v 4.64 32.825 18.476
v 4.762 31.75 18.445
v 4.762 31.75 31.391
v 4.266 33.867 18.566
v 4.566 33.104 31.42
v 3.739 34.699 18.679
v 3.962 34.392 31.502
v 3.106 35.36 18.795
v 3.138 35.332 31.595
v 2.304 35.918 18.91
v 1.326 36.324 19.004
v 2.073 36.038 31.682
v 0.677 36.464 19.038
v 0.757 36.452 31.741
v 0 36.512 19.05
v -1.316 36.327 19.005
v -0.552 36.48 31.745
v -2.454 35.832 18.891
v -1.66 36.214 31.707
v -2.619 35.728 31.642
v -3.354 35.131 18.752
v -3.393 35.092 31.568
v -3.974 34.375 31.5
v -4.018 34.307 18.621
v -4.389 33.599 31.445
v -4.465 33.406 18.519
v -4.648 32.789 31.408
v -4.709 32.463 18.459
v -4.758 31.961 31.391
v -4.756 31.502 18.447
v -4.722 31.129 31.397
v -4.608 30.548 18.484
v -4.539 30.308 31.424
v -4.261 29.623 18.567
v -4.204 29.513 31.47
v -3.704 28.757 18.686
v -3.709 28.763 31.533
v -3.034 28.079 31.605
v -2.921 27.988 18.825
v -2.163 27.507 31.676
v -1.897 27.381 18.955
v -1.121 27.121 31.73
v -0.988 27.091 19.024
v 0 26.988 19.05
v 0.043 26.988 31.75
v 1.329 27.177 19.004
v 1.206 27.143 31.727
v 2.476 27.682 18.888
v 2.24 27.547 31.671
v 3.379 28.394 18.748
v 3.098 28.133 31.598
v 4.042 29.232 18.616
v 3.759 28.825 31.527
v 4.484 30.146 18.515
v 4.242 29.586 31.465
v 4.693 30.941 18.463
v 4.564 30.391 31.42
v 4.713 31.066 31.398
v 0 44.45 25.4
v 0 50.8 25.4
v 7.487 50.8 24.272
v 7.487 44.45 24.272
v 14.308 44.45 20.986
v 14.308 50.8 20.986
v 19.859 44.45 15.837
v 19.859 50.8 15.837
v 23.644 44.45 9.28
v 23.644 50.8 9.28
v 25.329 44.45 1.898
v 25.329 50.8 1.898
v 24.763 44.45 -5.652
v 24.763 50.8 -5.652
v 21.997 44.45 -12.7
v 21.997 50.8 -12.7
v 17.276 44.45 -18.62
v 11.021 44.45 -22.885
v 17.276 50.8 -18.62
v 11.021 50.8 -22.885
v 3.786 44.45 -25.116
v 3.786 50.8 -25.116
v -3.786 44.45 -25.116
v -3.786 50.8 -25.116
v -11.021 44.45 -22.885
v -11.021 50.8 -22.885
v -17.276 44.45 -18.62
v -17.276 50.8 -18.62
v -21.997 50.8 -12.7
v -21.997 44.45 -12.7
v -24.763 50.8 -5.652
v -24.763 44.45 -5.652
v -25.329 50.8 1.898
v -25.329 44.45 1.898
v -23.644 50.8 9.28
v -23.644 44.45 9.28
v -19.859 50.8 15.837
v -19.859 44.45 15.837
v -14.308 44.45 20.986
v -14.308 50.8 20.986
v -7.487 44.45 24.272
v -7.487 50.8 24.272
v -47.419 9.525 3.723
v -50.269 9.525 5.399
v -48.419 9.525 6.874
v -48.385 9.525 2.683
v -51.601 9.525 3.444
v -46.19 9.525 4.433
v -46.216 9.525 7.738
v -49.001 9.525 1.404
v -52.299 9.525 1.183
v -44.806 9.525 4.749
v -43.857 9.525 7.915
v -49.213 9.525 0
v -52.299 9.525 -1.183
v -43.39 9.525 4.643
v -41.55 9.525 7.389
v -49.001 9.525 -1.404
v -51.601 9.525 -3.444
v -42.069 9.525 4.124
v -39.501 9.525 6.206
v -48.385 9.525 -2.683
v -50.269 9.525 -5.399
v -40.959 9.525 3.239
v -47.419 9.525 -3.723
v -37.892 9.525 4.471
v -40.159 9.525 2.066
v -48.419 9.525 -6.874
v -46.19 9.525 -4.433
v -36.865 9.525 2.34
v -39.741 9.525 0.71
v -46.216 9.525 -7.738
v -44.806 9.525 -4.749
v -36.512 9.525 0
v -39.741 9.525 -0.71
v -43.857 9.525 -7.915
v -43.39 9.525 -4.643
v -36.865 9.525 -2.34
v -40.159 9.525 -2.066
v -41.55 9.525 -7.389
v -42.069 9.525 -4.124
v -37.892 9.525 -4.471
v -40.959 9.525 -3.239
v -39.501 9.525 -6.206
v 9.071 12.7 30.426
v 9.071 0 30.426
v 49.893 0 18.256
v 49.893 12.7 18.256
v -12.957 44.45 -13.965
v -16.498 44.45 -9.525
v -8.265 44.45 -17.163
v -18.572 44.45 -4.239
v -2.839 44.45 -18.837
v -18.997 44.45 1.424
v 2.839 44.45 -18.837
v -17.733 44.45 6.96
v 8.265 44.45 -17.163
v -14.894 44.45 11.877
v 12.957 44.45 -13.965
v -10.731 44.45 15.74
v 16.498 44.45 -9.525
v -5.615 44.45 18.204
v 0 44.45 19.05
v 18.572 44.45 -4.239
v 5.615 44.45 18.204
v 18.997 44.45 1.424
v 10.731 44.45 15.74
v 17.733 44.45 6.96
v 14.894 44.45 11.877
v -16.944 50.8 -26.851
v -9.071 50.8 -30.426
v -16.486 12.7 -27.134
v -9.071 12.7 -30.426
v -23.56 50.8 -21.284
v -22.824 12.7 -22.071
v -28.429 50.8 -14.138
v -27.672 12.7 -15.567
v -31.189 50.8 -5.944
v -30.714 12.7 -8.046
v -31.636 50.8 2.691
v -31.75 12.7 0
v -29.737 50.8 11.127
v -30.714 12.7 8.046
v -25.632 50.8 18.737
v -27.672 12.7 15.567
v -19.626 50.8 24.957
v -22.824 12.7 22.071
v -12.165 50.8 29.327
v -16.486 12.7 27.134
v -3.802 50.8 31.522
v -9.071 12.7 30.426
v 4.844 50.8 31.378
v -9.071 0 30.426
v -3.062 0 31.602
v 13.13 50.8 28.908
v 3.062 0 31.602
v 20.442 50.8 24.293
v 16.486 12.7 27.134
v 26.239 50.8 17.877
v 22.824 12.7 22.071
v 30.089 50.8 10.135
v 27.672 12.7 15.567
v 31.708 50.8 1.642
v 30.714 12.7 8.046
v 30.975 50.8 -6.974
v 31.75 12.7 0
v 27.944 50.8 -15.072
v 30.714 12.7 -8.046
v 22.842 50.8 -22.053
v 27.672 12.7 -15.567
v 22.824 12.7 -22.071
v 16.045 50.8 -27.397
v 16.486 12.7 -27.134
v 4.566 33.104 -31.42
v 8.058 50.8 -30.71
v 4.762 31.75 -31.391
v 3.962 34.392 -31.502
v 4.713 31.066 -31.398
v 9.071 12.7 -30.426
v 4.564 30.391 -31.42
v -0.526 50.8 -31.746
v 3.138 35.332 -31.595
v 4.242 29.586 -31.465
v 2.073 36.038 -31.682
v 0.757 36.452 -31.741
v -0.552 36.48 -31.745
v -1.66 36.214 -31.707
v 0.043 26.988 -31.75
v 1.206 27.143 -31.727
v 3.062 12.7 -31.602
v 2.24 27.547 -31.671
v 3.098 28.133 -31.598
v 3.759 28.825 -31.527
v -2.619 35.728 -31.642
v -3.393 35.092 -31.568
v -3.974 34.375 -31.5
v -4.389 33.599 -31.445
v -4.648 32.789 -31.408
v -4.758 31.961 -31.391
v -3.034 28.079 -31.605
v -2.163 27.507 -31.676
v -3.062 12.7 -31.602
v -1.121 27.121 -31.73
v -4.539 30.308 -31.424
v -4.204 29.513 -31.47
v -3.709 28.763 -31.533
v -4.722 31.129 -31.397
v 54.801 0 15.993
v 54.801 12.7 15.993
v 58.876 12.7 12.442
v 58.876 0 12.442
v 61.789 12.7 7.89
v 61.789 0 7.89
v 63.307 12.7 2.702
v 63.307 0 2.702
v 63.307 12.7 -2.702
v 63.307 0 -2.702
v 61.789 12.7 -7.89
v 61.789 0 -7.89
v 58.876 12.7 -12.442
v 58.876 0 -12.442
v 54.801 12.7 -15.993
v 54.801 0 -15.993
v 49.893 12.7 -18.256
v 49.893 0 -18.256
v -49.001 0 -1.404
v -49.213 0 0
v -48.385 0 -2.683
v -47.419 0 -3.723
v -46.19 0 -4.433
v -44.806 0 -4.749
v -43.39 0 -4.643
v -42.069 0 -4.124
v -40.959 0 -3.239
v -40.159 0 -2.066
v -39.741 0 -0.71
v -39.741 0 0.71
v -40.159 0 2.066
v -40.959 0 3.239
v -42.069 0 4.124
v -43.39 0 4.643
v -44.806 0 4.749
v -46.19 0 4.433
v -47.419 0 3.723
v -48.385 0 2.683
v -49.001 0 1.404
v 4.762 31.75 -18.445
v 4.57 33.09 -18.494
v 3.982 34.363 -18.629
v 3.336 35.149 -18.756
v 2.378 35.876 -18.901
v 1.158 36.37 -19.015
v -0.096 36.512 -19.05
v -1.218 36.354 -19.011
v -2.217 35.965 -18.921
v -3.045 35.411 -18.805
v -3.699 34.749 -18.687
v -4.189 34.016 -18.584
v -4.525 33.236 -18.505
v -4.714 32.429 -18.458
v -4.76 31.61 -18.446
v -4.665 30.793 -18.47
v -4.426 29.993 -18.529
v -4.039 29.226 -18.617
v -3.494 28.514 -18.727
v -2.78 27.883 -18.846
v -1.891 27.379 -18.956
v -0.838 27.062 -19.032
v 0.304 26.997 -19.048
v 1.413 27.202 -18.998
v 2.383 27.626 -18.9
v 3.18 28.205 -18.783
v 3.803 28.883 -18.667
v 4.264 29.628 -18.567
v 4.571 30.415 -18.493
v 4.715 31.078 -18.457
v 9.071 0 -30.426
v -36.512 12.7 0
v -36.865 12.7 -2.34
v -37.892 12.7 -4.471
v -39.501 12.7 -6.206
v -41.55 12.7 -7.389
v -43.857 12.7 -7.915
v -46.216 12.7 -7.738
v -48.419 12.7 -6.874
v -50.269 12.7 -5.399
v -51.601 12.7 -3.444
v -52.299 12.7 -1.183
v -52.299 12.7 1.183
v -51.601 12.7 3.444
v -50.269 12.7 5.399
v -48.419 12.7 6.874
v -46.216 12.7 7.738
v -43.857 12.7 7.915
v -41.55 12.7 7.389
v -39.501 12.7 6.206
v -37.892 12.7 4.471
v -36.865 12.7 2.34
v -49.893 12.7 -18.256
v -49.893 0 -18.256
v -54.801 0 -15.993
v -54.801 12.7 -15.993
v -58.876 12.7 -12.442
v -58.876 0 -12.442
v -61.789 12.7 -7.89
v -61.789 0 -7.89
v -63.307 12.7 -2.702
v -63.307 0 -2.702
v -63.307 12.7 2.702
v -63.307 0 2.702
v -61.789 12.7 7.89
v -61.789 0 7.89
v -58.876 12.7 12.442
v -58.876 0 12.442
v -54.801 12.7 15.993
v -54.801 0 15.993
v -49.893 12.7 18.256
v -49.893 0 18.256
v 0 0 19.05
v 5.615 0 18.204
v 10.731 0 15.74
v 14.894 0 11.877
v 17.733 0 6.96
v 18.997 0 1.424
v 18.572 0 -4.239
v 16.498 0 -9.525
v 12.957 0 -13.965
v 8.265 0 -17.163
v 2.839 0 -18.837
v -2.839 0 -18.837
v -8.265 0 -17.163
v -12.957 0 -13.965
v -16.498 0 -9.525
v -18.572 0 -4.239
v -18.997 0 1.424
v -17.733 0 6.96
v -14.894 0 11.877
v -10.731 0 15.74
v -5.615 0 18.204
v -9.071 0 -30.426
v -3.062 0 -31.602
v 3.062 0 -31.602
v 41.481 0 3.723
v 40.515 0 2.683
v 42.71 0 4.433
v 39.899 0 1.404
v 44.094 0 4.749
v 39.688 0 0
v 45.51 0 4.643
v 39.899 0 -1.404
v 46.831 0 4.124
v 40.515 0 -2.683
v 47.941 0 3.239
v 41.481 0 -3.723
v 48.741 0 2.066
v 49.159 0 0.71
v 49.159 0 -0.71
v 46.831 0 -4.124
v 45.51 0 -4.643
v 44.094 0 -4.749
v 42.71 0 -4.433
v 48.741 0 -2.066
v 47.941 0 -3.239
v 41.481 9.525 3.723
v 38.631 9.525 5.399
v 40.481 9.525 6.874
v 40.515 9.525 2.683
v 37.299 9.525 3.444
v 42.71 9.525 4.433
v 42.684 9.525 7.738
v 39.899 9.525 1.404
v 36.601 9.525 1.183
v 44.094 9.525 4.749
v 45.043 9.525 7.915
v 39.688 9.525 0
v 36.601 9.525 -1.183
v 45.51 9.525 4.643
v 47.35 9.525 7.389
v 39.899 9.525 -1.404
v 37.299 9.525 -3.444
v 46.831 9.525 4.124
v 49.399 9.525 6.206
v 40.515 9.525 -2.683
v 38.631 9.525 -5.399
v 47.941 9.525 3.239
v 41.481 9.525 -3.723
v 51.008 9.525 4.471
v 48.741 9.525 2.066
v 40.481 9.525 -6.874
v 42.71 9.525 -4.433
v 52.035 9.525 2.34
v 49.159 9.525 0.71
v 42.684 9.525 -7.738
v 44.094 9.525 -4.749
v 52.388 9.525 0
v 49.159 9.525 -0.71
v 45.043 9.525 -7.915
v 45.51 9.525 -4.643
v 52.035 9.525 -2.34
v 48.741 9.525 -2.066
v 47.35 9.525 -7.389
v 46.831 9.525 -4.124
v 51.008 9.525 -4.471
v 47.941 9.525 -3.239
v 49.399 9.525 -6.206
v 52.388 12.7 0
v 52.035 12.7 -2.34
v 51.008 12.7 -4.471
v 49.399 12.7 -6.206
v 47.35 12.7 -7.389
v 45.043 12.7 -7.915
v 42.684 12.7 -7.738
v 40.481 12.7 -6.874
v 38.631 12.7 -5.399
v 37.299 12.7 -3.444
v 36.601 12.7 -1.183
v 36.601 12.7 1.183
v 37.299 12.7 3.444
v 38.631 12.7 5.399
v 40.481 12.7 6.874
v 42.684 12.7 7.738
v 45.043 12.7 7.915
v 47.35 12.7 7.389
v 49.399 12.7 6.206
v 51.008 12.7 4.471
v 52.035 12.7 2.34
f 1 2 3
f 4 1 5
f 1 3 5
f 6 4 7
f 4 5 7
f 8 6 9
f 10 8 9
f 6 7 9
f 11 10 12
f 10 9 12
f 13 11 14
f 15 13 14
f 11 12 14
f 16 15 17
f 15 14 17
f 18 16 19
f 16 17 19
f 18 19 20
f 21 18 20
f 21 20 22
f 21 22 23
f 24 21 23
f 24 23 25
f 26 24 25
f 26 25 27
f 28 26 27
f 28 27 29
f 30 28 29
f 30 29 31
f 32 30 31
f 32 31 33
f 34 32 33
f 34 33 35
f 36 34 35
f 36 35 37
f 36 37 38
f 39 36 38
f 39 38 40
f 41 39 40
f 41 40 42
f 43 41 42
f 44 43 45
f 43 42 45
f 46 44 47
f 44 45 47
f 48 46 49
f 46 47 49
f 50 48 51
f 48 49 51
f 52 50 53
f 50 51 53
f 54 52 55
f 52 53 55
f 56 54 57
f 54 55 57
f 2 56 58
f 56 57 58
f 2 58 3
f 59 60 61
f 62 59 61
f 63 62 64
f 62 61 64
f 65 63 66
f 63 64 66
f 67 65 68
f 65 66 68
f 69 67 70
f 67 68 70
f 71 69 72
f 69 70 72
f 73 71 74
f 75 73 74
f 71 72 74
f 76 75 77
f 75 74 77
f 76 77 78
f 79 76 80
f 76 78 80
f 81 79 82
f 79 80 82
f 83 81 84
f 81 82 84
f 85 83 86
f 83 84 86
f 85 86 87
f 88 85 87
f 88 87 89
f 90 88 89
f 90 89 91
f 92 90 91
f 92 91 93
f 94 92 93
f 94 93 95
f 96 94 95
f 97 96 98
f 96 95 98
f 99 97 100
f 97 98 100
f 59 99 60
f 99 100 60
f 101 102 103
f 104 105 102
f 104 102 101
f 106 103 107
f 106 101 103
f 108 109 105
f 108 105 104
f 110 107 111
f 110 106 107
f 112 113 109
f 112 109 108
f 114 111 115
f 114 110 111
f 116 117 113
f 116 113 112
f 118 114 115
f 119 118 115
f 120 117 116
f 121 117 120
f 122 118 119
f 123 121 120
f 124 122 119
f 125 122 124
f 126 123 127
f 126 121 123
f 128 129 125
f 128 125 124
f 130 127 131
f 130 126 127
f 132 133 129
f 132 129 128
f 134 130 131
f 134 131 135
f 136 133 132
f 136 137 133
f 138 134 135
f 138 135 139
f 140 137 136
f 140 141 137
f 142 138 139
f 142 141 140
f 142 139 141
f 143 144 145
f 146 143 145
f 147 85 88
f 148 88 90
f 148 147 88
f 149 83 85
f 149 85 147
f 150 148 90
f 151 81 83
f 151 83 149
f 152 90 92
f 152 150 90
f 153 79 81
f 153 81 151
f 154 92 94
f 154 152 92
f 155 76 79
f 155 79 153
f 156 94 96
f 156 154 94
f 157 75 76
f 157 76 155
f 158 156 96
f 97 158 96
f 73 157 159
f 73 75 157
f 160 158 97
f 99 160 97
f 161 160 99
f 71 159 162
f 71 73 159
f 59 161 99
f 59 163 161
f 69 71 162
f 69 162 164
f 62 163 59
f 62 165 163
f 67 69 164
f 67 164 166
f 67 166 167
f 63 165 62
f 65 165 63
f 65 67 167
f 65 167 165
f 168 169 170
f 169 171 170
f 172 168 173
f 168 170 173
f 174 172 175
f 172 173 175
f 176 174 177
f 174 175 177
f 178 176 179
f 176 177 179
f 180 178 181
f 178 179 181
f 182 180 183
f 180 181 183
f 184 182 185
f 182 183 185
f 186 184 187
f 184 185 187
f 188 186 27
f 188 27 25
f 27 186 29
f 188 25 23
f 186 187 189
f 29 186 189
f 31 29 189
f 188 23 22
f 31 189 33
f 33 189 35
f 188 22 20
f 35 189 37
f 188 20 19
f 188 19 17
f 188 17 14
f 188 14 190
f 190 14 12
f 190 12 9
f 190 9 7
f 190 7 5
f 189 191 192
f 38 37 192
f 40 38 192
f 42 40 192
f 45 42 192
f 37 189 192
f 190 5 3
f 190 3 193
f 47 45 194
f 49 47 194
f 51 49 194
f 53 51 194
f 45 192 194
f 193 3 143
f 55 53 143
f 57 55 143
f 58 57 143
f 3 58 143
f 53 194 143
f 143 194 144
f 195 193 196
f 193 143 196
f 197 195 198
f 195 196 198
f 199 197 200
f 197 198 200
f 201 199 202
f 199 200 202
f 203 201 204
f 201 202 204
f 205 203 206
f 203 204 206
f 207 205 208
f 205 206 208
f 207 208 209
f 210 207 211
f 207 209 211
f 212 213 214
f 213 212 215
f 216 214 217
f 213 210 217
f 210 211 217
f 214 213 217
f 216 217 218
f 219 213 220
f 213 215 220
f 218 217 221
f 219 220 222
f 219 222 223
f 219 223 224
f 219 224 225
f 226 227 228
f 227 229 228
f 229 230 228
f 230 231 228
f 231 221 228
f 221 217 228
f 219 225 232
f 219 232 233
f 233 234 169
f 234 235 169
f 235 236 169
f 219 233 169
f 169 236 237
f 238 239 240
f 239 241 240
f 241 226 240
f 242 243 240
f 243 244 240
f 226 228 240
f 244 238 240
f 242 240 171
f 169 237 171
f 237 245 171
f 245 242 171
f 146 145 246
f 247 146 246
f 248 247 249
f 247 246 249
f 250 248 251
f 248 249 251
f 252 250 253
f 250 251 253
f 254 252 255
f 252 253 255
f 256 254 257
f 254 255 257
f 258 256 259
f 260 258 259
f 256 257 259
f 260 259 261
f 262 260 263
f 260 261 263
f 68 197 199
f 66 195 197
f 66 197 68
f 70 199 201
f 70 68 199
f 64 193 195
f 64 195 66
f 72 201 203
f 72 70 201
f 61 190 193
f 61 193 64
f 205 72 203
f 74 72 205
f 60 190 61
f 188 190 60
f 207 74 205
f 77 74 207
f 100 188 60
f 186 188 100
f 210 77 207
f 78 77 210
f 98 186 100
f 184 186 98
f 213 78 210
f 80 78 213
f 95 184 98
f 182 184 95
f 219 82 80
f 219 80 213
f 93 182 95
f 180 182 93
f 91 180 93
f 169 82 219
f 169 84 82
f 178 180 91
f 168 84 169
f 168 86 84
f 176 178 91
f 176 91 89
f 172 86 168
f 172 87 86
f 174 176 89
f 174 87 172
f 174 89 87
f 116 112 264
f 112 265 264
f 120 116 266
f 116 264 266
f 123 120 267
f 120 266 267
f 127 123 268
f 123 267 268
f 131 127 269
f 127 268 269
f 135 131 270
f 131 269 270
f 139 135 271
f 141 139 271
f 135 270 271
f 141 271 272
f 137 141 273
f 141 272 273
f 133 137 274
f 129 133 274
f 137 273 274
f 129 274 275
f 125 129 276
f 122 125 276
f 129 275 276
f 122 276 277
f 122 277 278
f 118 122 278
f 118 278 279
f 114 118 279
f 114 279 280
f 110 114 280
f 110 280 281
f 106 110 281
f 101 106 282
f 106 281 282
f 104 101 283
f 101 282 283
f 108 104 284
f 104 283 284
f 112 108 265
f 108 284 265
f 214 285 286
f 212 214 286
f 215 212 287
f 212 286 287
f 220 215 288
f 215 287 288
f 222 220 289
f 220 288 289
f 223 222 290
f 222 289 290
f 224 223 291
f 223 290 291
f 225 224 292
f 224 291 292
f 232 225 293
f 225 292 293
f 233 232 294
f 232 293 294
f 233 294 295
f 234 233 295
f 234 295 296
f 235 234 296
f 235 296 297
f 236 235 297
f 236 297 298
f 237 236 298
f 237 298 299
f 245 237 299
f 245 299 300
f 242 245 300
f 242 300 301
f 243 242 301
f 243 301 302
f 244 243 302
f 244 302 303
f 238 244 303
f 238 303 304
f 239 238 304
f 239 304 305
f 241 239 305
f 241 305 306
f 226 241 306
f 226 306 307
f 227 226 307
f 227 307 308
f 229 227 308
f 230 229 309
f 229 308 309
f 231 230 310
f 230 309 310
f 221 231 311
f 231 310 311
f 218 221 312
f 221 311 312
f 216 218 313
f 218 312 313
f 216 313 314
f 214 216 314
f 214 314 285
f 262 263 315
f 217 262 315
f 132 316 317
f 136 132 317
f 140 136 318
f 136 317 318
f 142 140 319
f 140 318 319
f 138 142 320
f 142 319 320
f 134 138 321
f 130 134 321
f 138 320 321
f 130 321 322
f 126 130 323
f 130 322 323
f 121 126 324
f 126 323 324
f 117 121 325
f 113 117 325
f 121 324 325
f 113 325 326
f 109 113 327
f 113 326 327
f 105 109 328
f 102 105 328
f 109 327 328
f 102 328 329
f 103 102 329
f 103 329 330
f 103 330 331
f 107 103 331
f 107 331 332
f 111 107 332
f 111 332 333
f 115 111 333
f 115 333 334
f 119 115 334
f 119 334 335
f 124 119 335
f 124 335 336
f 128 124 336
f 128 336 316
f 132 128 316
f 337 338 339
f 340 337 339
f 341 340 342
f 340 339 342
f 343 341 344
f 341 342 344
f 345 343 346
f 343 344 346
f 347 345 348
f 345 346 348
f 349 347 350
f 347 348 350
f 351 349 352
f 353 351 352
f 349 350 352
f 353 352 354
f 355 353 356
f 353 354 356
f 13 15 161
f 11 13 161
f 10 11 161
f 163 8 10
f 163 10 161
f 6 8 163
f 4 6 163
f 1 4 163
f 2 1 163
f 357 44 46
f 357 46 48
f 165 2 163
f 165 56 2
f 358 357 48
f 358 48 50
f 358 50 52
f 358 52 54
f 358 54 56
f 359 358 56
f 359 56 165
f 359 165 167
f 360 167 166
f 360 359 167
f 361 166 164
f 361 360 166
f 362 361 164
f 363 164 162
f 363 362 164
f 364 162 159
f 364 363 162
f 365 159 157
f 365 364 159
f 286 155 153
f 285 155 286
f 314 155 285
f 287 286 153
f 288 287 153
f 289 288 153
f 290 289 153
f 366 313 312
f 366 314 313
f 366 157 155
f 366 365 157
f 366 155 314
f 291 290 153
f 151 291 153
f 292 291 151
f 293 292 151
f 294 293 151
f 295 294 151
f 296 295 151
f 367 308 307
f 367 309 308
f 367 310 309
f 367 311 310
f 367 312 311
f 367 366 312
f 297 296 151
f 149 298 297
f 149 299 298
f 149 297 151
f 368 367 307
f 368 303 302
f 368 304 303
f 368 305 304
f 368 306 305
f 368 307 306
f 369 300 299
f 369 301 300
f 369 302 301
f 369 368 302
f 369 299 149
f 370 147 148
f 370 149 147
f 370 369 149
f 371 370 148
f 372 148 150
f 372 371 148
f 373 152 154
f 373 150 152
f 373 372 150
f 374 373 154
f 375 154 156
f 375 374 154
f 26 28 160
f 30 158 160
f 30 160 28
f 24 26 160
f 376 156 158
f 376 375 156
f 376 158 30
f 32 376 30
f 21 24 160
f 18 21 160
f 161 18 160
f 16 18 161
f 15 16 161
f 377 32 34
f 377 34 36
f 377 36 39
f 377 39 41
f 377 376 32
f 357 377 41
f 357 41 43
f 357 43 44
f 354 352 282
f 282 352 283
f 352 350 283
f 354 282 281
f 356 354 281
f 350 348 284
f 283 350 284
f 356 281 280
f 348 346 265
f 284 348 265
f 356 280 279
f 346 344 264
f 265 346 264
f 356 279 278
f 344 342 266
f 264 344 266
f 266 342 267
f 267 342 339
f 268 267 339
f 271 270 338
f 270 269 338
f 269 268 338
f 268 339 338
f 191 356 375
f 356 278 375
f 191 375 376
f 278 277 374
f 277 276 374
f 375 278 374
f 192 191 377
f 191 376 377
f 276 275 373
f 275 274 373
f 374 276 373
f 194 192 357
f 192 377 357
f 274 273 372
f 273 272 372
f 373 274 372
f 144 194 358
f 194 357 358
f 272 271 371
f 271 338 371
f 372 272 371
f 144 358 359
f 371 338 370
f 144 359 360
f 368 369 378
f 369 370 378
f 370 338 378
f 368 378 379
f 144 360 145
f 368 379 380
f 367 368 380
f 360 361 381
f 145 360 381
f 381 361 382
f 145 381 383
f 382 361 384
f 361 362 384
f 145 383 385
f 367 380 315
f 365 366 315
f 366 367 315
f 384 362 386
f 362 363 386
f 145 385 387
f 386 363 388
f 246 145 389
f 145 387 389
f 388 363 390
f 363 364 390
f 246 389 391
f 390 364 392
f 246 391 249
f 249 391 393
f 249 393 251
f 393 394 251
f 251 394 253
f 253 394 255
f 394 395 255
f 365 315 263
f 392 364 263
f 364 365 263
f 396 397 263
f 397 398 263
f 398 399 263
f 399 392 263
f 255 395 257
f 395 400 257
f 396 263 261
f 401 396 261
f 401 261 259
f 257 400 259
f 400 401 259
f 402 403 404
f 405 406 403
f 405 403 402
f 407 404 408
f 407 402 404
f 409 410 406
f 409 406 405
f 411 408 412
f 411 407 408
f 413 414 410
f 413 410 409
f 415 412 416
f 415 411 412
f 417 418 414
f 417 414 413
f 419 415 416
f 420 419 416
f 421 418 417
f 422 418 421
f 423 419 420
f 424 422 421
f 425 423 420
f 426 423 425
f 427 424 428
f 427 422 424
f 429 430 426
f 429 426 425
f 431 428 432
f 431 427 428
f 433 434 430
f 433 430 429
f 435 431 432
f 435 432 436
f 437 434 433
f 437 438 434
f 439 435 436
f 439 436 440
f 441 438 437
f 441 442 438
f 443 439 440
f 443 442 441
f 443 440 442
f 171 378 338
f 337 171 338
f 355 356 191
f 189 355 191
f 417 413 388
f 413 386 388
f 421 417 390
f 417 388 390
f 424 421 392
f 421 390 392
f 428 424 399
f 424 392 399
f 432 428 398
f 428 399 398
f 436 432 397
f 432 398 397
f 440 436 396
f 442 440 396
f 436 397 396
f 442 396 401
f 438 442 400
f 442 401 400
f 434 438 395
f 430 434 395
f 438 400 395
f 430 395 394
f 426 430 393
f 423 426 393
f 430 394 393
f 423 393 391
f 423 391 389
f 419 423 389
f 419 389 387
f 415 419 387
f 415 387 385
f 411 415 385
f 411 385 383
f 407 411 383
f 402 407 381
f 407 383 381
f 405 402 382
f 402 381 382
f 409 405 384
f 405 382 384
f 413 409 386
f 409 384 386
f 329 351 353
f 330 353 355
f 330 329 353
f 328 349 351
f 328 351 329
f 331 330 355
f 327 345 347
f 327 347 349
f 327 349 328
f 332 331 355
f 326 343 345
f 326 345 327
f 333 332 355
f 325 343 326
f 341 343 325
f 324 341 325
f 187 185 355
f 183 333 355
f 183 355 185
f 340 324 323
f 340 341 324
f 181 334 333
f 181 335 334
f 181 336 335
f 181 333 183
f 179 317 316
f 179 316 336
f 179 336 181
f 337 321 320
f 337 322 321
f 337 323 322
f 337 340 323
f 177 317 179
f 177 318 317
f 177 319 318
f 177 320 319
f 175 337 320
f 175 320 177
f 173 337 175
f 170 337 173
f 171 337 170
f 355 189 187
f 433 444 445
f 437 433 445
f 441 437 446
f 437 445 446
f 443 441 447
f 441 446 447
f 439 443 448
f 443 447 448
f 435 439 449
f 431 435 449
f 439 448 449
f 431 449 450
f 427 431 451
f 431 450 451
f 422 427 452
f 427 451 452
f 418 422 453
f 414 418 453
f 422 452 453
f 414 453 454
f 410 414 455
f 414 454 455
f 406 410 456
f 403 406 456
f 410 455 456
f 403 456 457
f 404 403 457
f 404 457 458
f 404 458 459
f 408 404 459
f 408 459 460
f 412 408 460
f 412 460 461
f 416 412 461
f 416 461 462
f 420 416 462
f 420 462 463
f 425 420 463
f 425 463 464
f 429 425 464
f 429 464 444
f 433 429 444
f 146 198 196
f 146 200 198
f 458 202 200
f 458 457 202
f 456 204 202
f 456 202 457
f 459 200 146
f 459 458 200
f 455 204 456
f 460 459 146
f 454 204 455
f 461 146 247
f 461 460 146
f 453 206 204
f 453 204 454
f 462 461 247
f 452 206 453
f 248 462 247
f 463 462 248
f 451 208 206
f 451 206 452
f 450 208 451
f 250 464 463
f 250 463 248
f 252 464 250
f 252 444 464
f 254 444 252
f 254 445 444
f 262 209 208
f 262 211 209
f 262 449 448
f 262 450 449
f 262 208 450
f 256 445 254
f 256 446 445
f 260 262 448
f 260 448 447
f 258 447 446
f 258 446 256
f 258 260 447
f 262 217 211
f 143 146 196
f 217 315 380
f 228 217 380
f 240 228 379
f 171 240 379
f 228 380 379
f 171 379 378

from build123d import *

# Parameters (mm, degrees)
SKETCH1_R                    = 31.75
SKETCH1_R_2                  = 19.05
BOSS_EXTRUDE1_DEPTH          = 12.7
SKETCH2_R                    = 31.75
SKETCH2_R_2                  = 19.05
BOSS_EXTRUDE2_DEPTH          = 38.1
SKETCH3_R                    = 25.4
CUT_EXTRUDE1_DEPTH           = 6.35
HOLE1_D                      = 9.525
HOLE1_DEPTH                  = 12.7
HOLE1_CBORE_D                = 15.875
HOLE1_CBORE_DEPTH            = 3.175
HOLE1_TIP                    = 2.861598698
F_3_8_0_375_DIAMETER_HOLE1_D = 9.525


with BuildPart() as part:
    # Sketch1 → Boss-Extrude1 (new body)
    # profile 1 of 3: a face of its own
    with BuildSketch(Plane(origin=(0, 0, 0), x_dir=(1, 0, 0), z_dir=(0, 1, 0))):
        with BuildLine():
            Line((-9.071428571, 30.426496408), (-49.892857143, 18.255897845))
            ThreePointArc((-49.892857143, 18.255897845), (-63.5, 0), (-49.892857143, -18.255897845))
            Line((-49.892857143, -18.255897845), (-9.071428571, -30.426496408))
            ThreePointArc((-9.071428571, -30.426496408), (-31.75, 0), (-9.071428571, 30.426496408))
        make_face()
    # profile 2 of 3: a face of its own
    with BuildSketch(Plane(origin=(0, 0, 0), x_dir=(1, 0, 0), z_dir=(0, 1, 0))):
        Circle(SKETCH1_R)
        with Locations(Location((0, 0, 0), (0, 0, 270))):
            Circle(SKETCH1_R_2, mode=Mode.SUBTRACT)
    # profile 3 of 3: a face of its own
    with BuildSketch(Plane(origin=(0, 0, 0), x_dir=(1, 0, 0), z_dir=(0, 1, 0))):
        with BuildLine():
            Line((49.892857143, 18.255897845), (9.071428571, 30.426496408))
            ThreePointArc((9.071428571, 30.426496408), (25.456633292, 18.974254173), (31.75, 0))
            ThreePointArc((31.75, 0), (25.456633292, -18.974254173), (9.071428571, -30.426496408))
            Line((9.071428571, -30.426496408), (49.892857143, -18.255897845))
            ThreePointArc((49.892857143, -18.255897845), (63.5, 0), (49.892857143, 18.255897845))
        make_face()
    extrude(amount=BOSS_EXTRUDE1_DEPTH)

    # Sketch2 → Boss-Extrude2 (add)
    with BuildSketch(Plane(origin=(0, 12.7, 0), x_dir=(1, 0, 0), z_dir=(0, 1, 0))):
        with Locations(Location((0, 0, 0), (0, 0, 106.601549599))):
            Circle(SKETCH2_R)
        with Locations(Location((0, 0, 0), (0, 0, 270))):
            Circle(SKETCH2_R_2, mode=Mode.SUBTRACT)
    extrude(amount=BOSS_EXTRUDE2_DEPTH)

    # Sketch3 → Cut-Extrude1 (cut)
    with BuildSketch(Plane(origin=(0, 50.8, 0), x_dir=(1, 0, 0), z_dir=(0, 1, 0))):
        with Locations(Location((0, 0, 0), (0, 0, 270))):
            Circle(SKETCH3_R)
    extrude(amount=-CUT_EXTRUDE1_DEPTH, mode=Mode.SUBTRACT)

    # Hole1
    with Locations(Plane(origin=(0, 12.7, 0), x_dir=(1, 0, 0), z_dir=(0, 1, 0))):
        with Locations((-44.45, 0), (44.45, 0)):
            CounterBoreHole(HOLE1_D / 2, HOLE1_CBORE_D / 2, HOLE1_CBORE_DEPTH, depth=HOLE1_DEPTH)
            with Locations((0, 0, -(HOLE1_DEPTH + HOLE1_TIP / 2))):  # 118° drill point
                Cone(0, HOLE1_D / 2, HOLE1_TIP, mode=Mode.SUBTRACT)

    # 3/8 (0.375) Diameter Hole1 (through all)
    with Locations(Plane(origin=(0, 31.75, -31.75), x_dir=(-1, 0, 0), z_dir=(0, 0, -1))):
        with Locations((0, 0)):
            Hole(F_3_8_0_375_DIAMETER_HOLE1_D / 2)


solid = part.part
